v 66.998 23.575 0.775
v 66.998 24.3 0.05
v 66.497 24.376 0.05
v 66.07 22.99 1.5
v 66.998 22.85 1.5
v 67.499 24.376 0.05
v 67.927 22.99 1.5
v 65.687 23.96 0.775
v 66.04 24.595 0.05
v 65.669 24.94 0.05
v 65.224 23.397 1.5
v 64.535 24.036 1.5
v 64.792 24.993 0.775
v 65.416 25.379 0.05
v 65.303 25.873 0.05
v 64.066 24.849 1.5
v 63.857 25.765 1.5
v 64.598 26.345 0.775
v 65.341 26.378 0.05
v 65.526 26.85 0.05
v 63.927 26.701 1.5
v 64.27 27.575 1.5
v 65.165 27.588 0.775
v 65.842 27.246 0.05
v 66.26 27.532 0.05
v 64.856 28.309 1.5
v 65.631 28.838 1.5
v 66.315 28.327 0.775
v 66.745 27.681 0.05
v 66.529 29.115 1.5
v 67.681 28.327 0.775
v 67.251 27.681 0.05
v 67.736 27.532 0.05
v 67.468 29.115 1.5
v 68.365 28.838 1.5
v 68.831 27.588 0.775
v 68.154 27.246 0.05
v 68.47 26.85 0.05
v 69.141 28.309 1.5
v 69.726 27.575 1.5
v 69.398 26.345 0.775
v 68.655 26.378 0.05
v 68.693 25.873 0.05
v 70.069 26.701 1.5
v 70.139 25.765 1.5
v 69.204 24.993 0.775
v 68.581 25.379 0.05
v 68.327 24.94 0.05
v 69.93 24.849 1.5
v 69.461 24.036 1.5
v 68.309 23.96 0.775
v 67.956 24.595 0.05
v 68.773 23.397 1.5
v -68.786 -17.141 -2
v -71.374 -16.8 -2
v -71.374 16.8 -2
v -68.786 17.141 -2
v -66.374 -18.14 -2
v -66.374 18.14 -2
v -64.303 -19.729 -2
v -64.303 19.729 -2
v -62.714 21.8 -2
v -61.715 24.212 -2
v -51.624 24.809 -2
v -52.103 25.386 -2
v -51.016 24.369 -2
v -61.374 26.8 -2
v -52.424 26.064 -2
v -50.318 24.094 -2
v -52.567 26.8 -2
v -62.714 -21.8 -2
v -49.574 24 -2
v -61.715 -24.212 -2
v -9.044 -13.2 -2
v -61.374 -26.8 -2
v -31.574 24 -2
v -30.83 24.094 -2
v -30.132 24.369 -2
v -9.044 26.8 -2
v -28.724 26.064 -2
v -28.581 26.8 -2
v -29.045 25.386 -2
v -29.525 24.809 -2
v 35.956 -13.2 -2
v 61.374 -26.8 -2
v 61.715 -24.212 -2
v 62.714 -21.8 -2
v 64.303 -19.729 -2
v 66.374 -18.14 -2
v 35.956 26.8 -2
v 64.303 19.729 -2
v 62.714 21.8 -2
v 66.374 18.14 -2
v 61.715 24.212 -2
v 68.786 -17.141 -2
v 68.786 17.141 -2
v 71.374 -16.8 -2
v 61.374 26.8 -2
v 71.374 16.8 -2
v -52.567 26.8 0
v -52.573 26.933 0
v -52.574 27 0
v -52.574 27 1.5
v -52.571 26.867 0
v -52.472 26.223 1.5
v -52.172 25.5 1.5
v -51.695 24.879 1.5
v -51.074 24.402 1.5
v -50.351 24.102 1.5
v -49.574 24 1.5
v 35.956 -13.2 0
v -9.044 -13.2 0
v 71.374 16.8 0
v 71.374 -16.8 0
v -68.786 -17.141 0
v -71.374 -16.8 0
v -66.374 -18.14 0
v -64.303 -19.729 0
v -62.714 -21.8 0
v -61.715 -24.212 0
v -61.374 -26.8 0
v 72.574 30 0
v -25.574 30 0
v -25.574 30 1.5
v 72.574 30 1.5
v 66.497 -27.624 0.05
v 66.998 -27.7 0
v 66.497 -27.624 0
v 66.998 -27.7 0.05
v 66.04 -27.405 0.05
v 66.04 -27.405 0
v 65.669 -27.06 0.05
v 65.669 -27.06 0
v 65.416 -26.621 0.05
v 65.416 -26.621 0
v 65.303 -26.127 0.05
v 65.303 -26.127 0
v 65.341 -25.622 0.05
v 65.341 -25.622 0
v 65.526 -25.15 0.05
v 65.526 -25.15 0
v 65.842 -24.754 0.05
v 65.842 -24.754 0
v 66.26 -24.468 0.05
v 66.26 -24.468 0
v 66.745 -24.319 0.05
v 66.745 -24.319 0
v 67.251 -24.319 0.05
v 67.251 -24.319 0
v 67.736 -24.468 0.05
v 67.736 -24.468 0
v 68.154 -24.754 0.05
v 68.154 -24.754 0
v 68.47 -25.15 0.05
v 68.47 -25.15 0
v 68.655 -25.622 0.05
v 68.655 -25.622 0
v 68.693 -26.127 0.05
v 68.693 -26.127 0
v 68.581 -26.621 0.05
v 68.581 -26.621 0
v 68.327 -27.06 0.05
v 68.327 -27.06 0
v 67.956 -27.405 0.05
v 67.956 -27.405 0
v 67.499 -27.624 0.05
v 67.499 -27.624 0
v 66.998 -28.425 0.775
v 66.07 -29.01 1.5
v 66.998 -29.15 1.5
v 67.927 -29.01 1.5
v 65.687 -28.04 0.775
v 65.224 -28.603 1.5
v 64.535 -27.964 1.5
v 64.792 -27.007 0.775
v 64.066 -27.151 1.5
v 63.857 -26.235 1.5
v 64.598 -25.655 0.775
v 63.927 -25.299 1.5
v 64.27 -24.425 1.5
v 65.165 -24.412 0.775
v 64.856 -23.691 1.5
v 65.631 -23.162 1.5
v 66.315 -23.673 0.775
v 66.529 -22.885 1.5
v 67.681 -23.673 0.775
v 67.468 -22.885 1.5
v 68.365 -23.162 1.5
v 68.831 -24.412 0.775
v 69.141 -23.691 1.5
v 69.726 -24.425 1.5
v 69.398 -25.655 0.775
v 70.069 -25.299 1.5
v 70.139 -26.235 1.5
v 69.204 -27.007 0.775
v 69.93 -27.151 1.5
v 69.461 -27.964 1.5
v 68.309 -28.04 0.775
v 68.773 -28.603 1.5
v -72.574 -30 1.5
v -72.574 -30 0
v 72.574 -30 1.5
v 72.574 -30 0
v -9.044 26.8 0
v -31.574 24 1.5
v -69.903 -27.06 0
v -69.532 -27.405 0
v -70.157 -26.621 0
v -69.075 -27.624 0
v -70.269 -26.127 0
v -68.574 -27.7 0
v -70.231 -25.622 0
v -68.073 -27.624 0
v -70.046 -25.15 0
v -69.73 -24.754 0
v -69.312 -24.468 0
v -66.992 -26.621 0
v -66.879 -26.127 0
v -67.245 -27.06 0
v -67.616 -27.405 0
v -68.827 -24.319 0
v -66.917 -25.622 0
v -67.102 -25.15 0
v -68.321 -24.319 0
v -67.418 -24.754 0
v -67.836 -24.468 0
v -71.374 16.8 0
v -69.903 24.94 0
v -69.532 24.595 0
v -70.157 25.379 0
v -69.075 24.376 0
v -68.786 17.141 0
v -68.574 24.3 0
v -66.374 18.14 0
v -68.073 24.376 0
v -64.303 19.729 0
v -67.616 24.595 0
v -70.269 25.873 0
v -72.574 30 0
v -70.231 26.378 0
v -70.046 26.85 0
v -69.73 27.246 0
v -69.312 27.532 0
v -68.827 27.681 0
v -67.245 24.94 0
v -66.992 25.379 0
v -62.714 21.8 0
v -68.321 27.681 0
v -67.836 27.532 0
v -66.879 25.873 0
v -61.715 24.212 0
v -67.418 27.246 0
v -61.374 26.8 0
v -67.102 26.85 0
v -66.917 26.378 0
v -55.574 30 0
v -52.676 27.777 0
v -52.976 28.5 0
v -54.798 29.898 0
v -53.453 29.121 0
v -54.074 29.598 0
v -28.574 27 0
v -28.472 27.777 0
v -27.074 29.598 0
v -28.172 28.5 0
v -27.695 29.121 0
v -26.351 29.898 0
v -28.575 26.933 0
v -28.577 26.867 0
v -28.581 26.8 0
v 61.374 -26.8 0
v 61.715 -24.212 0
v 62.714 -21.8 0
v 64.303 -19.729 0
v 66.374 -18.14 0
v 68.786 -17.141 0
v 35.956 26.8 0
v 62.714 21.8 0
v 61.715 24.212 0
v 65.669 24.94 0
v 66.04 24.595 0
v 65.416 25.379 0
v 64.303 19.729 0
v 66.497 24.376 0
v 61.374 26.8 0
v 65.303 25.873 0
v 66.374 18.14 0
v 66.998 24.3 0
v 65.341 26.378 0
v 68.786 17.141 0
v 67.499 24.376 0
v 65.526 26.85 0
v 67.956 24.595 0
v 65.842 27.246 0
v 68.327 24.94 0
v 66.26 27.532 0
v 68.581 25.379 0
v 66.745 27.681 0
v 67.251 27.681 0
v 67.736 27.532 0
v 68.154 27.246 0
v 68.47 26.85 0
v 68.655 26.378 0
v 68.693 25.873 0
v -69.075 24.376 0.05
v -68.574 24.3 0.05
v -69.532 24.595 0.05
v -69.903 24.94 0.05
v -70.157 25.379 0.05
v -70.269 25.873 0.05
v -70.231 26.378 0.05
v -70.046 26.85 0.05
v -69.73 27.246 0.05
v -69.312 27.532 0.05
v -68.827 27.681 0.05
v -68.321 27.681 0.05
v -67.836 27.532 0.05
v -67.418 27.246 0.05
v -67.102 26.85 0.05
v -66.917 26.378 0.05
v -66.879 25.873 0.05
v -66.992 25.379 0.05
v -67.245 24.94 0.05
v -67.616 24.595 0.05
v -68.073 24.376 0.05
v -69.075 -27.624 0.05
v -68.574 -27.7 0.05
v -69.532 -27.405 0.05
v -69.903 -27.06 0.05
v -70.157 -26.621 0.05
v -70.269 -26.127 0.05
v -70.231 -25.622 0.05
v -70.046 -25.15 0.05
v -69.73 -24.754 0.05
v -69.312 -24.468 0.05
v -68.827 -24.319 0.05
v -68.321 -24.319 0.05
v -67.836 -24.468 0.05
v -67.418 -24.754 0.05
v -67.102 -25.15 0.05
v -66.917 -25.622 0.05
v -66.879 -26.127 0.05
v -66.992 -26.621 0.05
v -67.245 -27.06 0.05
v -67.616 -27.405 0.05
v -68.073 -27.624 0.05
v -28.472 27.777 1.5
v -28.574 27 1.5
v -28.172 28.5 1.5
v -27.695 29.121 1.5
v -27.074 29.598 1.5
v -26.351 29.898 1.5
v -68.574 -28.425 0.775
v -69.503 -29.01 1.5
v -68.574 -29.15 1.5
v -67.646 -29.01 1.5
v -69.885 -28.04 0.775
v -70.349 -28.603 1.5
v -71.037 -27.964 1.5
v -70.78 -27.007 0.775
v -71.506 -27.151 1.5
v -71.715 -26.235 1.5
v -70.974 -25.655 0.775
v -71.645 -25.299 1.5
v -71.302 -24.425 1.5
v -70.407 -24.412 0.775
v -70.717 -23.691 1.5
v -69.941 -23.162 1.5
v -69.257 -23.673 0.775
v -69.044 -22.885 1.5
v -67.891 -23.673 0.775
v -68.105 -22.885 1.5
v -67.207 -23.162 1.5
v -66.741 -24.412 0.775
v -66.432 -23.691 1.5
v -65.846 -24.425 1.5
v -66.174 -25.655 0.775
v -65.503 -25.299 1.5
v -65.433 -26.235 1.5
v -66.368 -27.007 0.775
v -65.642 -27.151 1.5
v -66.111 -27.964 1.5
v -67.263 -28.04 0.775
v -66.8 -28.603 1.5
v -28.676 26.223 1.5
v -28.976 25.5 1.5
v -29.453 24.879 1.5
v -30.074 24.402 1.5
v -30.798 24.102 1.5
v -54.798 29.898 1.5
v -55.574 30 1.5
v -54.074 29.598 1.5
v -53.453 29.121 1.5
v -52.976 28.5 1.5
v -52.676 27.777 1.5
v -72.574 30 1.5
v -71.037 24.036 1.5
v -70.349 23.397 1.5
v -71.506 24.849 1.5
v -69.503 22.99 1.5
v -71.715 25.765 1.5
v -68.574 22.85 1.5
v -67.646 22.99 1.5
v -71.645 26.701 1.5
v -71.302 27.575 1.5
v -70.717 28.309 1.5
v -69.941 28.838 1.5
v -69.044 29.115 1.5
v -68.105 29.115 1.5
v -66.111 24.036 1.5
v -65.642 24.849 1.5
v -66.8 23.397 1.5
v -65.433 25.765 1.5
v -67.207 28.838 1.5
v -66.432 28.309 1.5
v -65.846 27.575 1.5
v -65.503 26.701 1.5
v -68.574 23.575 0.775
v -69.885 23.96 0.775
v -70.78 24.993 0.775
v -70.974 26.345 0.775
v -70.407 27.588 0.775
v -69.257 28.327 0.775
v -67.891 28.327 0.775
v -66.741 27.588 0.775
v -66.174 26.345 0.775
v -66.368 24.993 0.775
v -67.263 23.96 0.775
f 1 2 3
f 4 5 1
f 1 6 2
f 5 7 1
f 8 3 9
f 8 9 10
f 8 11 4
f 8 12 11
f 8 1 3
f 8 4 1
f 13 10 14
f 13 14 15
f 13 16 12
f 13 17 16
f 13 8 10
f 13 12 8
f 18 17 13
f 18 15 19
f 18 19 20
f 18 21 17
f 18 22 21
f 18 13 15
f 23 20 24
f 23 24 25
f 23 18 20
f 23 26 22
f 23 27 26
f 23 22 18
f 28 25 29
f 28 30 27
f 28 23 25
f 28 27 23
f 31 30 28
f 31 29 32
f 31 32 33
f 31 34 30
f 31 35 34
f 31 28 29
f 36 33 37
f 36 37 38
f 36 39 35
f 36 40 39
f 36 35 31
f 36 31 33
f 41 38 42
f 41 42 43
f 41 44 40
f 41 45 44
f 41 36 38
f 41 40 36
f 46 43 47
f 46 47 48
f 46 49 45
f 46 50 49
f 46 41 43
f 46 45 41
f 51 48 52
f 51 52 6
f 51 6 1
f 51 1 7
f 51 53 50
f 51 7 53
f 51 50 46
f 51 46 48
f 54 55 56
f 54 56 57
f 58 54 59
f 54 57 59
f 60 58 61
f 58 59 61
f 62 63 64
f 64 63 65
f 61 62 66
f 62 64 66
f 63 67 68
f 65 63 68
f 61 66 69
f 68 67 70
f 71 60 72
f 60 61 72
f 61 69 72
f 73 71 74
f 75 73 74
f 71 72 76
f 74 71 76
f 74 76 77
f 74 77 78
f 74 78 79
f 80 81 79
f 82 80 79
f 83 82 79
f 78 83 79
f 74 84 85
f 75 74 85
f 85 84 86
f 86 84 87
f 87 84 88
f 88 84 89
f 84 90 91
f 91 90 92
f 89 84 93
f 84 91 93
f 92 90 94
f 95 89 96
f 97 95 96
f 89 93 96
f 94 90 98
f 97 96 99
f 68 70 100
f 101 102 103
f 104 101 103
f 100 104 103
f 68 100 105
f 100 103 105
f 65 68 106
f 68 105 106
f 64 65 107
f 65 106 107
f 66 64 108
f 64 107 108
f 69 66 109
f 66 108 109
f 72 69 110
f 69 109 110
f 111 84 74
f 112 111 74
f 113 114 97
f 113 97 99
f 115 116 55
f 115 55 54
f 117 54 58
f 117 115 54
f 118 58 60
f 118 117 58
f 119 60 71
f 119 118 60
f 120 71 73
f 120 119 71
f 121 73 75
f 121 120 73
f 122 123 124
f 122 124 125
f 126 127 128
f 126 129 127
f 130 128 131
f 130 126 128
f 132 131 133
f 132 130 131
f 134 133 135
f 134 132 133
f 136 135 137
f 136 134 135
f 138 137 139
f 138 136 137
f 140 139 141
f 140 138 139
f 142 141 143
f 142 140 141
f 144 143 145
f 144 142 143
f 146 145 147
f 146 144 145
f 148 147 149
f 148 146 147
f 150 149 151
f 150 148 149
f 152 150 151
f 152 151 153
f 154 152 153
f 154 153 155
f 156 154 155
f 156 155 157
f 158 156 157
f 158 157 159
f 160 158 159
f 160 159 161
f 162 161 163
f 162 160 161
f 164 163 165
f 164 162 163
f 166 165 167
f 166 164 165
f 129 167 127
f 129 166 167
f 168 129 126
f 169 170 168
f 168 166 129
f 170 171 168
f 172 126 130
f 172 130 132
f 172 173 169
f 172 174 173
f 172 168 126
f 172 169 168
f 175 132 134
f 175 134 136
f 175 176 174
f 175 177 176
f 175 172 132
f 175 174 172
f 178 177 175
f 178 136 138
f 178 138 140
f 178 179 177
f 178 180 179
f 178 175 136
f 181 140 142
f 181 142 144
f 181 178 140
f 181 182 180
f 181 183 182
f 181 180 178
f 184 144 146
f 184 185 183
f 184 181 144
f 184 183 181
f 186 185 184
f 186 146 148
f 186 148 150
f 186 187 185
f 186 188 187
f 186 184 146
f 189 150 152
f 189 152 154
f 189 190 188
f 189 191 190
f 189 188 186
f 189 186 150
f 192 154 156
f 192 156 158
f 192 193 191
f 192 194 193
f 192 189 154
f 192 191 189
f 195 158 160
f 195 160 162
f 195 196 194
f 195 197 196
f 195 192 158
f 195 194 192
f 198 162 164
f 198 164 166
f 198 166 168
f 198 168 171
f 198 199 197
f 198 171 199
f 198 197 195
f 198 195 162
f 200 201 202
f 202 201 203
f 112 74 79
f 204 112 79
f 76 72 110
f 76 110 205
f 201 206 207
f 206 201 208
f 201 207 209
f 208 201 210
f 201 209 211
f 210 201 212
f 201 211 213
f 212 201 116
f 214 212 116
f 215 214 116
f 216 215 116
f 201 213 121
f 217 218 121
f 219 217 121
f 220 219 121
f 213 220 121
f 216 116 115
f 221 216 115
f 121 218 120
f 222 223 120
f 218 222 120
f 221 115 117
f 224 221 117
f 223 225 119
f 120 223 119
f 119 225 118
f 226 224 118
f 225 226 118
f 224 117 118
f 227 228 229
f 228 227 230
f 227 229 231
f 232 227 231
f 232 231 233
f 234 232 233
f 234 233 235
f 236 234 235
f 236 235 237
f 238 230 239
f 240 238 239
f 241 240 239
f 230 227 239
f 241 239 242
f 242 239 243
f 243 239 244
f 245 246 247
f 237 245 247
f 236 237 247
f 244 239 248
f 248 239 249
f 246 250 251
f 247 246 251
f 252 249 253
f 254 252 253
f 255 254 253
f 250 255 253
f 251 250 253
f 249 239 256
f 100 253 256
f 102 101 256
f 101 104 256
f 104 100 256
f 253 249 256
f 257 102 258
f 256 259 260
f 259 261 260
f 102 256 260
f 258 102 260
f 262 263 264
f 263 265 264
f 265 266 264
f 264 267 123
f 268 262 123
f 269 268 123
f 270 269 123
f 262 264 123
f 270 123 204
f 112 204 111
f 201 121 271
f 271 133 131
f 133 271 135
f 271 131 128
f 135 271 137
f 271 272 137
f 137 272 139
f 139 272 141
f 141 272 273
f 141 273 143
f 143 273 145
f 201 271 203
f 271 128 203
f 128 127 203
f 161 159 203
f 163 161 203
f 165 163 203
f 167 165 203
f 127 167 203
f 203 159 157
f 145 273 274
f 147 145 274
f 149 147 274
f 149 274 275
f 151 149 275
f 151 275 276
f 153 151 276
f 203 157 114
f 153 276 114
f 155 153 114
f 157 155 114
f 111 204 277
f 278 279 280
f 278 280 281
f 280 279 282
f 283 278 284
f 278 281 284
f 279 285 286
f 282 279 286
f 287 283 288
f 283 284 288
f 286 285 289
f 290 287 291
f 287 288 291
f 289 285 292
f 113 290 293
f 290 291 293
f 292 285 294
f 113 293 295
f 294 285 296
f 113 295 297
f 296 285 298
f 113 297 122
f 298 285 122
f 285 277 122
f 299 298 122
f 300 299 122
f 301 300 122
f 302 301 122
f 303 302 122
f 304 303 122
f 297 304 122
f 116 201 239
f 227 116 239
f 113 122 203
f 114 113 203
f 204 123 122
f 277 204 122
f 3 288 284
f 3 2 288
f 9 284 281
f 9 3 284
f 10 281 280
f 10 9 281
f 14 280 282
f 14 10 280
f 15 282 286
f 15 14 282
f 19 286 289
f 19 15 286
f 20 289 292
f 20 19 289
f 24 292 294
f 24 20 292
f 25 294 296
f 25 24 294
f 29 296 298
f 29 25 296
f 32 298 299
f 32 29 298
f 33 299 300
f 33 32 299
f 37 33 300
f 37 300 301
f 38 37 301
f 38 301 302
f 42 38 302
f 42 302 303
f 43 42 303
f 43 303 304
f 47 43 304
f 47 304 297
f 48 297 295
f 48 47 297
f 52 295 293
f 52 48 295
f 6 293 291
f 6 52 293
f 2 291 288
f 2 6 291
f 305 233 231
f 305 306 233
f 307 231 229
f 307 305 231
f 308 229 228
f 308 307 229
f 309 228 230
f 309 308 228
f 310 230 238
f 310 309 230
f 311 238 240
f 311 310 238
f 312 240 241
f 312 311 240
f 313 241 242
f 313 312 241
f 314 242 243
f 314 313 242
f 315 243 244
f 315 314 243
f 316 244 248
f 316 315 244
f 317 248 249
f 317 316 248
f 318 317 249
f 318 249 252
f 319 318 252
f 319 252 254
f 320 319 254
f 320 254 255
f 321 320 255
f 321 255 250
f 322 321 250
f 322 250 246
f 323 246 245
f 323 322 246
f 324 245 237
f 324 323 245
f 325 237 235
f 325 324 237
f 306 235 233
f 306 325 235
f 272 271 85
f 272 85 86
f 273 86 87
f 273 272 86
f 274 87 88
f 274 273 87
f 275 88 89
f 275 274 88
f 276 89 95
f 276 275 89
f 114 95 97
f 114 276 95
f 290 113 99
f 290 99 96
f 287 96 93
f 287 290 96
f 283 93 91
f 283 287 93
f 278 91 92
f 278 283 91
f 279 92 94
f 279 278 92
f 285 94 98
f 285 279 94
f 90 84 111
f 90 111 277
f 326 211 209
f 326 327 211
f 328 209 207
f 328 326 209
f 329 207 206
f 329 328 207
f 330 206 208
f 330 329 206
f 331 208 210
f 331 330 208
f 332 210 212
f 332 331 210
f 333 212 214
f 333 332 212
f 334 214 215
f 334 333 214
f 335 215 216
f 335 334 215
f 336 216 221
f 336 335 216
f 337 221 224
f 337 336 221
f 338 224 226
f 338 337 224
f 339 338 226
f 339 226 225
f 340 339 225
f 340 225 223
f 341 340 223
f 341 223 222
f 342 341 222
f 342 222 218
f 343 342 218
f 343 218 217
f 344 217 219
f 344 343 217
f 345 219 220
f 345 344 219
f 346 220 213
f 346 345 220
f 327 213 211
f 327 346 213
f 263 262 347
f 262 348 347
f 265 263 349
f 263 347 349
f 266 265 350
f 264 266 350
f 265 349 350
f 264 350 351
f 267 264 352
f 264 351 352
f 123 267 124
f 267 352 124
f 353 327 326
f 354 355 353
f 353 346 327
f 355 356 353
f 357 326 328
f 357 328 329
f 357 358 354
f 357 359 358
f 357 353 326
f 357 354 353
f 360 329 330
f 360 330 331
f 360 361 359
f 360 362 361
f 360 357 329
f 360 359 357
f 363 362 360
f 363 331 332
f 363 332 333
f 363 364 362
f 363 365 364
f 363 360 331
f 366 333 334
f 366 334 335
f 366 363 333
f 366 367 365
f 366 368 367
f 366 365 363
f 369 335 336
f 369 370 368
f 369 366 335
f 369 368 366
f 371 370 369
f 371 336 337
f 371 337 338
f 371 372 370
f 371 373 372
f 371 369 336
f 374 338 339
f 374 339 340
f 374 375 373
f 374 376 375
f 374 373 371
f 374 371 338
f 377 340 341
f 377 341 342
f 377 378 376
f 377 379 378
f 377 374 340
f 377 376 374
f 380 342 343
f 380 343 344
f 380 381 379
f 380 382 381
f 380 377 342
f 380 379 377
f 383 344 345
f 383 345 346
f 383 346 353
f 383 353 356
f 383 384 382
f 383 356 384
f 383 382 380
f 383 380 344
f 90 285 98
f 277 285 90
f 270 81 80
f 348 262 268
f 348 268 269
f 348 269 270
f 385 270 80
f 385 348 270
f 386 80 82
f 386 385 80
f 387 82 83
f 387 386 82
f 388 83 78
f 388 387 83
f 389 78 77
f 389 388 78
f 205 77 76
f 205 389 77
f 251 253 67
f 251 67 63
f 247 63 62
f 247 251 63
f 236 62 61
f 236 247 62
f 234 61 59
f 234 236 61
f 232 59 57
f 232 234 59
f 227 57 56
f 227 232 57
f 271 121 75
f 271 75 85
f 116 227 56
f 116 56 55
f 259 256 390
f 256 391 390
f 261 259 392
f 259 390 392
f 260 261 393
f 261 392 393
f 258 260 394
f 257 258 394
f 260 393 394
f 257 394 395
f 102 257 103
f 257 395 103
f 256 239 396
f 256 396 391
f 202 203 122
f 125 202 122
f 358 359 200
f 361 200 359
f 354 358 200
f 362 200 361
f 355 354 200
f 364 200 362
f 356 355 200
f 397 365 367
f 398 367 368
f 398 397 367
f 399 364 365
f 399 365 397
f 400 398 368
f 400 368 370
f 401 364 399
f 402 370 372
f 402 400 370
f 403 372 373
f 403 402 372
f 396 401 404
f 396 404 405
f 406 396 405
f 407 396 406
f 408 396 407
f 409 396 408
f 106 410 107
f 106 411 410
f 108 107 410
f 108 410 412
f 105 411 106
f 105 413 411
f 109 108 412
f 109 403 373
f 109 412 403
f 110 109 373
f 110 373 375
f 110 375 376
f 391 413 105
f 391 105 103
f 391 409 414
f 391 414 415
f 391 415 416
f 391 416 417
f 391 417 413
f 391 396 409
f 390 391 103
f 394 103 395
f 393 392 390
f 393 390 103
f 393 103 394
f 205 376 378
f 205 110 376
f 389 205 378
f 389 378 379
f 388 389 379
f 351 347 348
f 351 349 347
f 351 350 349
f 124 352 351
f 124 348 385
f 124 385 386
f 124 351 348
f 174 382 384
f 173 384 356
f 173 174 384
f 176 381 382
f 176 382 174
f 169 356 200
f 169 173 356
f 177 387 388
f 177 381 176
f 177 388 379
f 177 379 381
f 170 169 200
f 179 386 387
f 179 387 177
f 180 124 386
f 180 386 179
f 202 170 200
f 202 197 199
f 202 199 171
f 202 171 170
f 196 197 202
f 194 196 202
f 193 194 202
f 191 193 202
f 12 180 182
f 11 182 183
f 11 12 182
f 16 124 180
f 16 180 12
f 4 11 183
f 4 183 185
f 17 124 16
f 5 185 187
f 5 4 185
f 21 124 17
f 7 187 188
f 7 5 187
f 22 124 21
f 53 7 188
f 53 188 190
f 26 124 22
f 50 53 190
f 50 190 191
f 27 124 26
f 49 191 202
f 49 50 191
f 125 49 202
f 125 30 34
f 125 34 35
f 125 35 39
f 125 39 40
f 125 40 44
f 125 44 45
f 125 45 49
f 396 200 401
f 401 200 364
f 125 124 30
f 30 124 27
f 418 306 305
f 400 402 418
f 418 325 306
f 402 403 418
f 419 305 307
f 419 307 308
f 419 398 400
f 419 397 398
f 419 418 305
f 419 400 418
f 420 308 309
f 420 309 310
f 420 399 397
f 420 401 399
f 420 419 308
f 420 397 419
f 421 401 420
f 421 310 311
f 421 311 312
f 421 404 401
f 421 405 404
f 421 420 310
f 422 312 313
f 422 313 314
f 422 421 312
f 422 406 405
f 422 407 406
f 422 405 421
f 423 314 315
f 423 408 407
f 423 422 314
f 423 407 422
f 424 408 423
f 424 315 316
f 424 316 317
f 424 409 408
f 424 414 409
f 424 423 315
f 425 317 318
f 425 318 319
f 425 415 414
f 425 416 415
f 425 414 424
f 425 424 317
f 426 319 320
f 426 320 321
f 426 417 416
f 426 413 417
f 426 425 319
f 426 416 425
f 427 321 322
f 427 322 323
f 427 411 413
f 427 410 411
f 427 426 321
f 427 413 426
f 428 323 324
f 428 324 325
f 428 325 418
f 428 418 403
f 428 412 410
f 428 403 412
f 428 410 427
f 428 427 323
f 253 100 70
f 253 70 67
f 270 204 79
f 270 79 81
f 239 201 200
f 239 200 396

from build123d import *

# Parameters (mm, degrees)
ESQUISSE1_W                                 = 145.148196
ESQUISSE1_H                                 = 60
BOSS_EXTRU_1_DEPTH                          = 1.5
BOSS_EXTRU_2_DEPTH                          = 2
FRAISAGE_POUR_VIS_T_TE_FRAIS_E_M31_AT_COUNT = 2
FRAISAGE_POUR_VIS_T_TE_FRAIS_E_M31_AT_PITCH = 52
FRAISAGE_POUR_VIS_T_TE_FRAIS_E_M31_2_COUNT  = 2
FRAISAGE_POUR_VIS_T_TE_FRAIS_E_M31_2_PITCH  = 135.572178
FRAISAGE_POUR_VIS_T_TE_FRAIS_E_M31_3_COUNT  = 2
FRAISAGE_POUR_VIS_T_TE_FRAIS_E_M31_3_PITCH  = 145.20267025
ENL_V_MAT_EXTRU_1_DEPTH                     = 79.608203774
ENL_V_MAT_EXTRU_1_DEPTH_BACK                = 79.608203774
ESQUISSE6_W                                 = 24
ESQUISSE6_H                                 = 6
CONG_1_R                                    = 3
ESQUISSE7_W                                 = 45
ESQUISSE7_H                                 = 40
ENL_V_MAT_EXTRU_2_DEPTH                     = 2


with BuildPart() as part:
    # Esquisse1 → Boss.-Extru.1 (new body)
    with BuildSketch(Plane.XY):
        Rectangle(ESQUISSE1_W, ESQUISSE1_H)
    extrude(amount=BOSS_EXTRU_1_DEPTH)

    # Esquisse2 → Boss.-Extru.2 (add)
    with BuildSketch(Plane(origin=(0, 0, 0), x_dir=(-1, 0, 0), z_dir=(0, 0, -1))):
        with BuildLine():
            Line((-71.374098, -16.8), (-71.374098, 16.8))
            ThreePointArc((-71.374098, 16.8), (-64.303030188, 19.728932188), (-61.374098, 26.8))
            Line((-61.374098, 26.8), (61.374098, 26.8))
            ThreePointArc((61.374098, 26.8), (64.303030188, 19.728932188), (71.374098, 16.8))
            Line((71.374098, 16.8), (71.374098, -16.8))
            ThreePointArc((71.374098, -16.8), (64.303030188, -19.728932188), (61.374098, -26.8))
            Line((61.374098, -26.8), (-61.374098, -26.8))
            ThreePointArc((-61.374098, -26.8), (-64.303030188, -19.728932188), (-71.374098, -16.8))
        make_face()
    extrude(amount=BOSS_EXTRU_2_DEPTH)

    # Esquisse5 → Fraisage pour vis à tête fraisée M31 (revolve, cut)
    with BuildSketch(Plane(origin=(-68.574098, 26, 1.5), x_dir=(0, -1, 0), z_dir=(1, 0, 0))):
        Polygon((0, 0), (0, 1.5), (1.7, 1.5), (1.7, 1.45), (3.15, 0), align=None)
    fraisage_pour_vis_t_te_frais_e_m31 = revolve(axis=Axis((-68.574098, 26, 7.85), (0, 0, -1)), mode=Mode.SUBTRACT)

    # Fraisage pour vis à tête fraisée M31 at: Fraisage pour vis à tête fraisée M31 ×2
    with Locations(*[(0, -i * FRAISAGE_POUR_VIS_T_TE_FRAIS_E_M31_AT_PITCH, 0) for i in range(1, FRAISAGE_POUR_VIS_T_TE_FRAIS_E_M31_AT_COUNT)]):
        add(fraisage_pour_vis_t_te_frais_e_m31, mode=Mode.SUBTRACT)

    # Fraisage pour vis _ t_te frais_e M31 2: Fraisage pour vis à tête fraisée M31 ×2
    with Locations(*[(i * FRAISAGE_POUR_VIS_T_TE_FRAIS_E_M31_2_PITCH, 0, 0) for i in range(1, FRAISAGE_POUR_VIS_T_TE_FRAIS_E_M31_2_COUNT)]):
        add(fraisage_pour_vis_t_te_frais_e_m31, mode=Mode.SUBTRACT)

    # Fraisage pour vis _ t_te frais_e M31 3: Fraisage pour vis à tête fraisée M31 ×2
    with Locations(*[Vector(0.9336755155176905, -0.35812013588009123, 0) * (i * FRAISAGE_POUR_VIS_T_TE_FRAIS_E_M31_3_PITCH) for i in range(1, FRAISAGE_POUR_VIS_T_TE_FRAIS_E_M31_3_COUNT)]):
        add(fraisage_pour_vis_t_te_frais_e_m31, mode=Mode.SUBTRACT)

    # Esquisse6 → Enlèv. mat.-Extru.1 (cut, two sides: drawn at the far end of the back side and taken through both)
    with BuildSketch(Plane.XY.offset(1.5).offset(-ENL_V_MAT_EXTRU_1_DEPTH_BACK)):
        with Locations((-40.574098, 27)):
            Rectangle(ESQUISSE6_W, ESQUISSE6_H)
    extrude(amount=ENL_V_MAT_EXTRU_1_DEPTH + ENL_V_MAT_EXTRU_1_DEPTH_BACK, mode=Mode.SUBTRACT)

    # Congé1
    cong_1_edges = [part.edges().sort_by_distance(p)[0] for p in [
        (-28.574098, 30, 0.75),
        (-28.574098, 24, -0.25),
        (-52.574098, 30, 0.75),
        (-52.574098, 24, -0.25),
    ]]
    fillet(cong_1_edges, radius=CONG_1_R - 0.0001)  # a hair under: the kernel refuses the full size

    # Esquisse7 → Enlèv. mat.-Extru.2 (cut)
    with BuildSketch(Plane(origin=(0, 0, -2), x_dir=(-1, 0, 0), z_dir=(0, 0, -1))):
        with Locations((-13.455902, 6.8)):
            Rectangle(ESQUISSE7_W, ESQUISSE7_H)
    extrude(amount=-ENL_V_MAT_EXTRU_2_DEPTH, mode=Mode.SUBTRACT)


solid = part.part
